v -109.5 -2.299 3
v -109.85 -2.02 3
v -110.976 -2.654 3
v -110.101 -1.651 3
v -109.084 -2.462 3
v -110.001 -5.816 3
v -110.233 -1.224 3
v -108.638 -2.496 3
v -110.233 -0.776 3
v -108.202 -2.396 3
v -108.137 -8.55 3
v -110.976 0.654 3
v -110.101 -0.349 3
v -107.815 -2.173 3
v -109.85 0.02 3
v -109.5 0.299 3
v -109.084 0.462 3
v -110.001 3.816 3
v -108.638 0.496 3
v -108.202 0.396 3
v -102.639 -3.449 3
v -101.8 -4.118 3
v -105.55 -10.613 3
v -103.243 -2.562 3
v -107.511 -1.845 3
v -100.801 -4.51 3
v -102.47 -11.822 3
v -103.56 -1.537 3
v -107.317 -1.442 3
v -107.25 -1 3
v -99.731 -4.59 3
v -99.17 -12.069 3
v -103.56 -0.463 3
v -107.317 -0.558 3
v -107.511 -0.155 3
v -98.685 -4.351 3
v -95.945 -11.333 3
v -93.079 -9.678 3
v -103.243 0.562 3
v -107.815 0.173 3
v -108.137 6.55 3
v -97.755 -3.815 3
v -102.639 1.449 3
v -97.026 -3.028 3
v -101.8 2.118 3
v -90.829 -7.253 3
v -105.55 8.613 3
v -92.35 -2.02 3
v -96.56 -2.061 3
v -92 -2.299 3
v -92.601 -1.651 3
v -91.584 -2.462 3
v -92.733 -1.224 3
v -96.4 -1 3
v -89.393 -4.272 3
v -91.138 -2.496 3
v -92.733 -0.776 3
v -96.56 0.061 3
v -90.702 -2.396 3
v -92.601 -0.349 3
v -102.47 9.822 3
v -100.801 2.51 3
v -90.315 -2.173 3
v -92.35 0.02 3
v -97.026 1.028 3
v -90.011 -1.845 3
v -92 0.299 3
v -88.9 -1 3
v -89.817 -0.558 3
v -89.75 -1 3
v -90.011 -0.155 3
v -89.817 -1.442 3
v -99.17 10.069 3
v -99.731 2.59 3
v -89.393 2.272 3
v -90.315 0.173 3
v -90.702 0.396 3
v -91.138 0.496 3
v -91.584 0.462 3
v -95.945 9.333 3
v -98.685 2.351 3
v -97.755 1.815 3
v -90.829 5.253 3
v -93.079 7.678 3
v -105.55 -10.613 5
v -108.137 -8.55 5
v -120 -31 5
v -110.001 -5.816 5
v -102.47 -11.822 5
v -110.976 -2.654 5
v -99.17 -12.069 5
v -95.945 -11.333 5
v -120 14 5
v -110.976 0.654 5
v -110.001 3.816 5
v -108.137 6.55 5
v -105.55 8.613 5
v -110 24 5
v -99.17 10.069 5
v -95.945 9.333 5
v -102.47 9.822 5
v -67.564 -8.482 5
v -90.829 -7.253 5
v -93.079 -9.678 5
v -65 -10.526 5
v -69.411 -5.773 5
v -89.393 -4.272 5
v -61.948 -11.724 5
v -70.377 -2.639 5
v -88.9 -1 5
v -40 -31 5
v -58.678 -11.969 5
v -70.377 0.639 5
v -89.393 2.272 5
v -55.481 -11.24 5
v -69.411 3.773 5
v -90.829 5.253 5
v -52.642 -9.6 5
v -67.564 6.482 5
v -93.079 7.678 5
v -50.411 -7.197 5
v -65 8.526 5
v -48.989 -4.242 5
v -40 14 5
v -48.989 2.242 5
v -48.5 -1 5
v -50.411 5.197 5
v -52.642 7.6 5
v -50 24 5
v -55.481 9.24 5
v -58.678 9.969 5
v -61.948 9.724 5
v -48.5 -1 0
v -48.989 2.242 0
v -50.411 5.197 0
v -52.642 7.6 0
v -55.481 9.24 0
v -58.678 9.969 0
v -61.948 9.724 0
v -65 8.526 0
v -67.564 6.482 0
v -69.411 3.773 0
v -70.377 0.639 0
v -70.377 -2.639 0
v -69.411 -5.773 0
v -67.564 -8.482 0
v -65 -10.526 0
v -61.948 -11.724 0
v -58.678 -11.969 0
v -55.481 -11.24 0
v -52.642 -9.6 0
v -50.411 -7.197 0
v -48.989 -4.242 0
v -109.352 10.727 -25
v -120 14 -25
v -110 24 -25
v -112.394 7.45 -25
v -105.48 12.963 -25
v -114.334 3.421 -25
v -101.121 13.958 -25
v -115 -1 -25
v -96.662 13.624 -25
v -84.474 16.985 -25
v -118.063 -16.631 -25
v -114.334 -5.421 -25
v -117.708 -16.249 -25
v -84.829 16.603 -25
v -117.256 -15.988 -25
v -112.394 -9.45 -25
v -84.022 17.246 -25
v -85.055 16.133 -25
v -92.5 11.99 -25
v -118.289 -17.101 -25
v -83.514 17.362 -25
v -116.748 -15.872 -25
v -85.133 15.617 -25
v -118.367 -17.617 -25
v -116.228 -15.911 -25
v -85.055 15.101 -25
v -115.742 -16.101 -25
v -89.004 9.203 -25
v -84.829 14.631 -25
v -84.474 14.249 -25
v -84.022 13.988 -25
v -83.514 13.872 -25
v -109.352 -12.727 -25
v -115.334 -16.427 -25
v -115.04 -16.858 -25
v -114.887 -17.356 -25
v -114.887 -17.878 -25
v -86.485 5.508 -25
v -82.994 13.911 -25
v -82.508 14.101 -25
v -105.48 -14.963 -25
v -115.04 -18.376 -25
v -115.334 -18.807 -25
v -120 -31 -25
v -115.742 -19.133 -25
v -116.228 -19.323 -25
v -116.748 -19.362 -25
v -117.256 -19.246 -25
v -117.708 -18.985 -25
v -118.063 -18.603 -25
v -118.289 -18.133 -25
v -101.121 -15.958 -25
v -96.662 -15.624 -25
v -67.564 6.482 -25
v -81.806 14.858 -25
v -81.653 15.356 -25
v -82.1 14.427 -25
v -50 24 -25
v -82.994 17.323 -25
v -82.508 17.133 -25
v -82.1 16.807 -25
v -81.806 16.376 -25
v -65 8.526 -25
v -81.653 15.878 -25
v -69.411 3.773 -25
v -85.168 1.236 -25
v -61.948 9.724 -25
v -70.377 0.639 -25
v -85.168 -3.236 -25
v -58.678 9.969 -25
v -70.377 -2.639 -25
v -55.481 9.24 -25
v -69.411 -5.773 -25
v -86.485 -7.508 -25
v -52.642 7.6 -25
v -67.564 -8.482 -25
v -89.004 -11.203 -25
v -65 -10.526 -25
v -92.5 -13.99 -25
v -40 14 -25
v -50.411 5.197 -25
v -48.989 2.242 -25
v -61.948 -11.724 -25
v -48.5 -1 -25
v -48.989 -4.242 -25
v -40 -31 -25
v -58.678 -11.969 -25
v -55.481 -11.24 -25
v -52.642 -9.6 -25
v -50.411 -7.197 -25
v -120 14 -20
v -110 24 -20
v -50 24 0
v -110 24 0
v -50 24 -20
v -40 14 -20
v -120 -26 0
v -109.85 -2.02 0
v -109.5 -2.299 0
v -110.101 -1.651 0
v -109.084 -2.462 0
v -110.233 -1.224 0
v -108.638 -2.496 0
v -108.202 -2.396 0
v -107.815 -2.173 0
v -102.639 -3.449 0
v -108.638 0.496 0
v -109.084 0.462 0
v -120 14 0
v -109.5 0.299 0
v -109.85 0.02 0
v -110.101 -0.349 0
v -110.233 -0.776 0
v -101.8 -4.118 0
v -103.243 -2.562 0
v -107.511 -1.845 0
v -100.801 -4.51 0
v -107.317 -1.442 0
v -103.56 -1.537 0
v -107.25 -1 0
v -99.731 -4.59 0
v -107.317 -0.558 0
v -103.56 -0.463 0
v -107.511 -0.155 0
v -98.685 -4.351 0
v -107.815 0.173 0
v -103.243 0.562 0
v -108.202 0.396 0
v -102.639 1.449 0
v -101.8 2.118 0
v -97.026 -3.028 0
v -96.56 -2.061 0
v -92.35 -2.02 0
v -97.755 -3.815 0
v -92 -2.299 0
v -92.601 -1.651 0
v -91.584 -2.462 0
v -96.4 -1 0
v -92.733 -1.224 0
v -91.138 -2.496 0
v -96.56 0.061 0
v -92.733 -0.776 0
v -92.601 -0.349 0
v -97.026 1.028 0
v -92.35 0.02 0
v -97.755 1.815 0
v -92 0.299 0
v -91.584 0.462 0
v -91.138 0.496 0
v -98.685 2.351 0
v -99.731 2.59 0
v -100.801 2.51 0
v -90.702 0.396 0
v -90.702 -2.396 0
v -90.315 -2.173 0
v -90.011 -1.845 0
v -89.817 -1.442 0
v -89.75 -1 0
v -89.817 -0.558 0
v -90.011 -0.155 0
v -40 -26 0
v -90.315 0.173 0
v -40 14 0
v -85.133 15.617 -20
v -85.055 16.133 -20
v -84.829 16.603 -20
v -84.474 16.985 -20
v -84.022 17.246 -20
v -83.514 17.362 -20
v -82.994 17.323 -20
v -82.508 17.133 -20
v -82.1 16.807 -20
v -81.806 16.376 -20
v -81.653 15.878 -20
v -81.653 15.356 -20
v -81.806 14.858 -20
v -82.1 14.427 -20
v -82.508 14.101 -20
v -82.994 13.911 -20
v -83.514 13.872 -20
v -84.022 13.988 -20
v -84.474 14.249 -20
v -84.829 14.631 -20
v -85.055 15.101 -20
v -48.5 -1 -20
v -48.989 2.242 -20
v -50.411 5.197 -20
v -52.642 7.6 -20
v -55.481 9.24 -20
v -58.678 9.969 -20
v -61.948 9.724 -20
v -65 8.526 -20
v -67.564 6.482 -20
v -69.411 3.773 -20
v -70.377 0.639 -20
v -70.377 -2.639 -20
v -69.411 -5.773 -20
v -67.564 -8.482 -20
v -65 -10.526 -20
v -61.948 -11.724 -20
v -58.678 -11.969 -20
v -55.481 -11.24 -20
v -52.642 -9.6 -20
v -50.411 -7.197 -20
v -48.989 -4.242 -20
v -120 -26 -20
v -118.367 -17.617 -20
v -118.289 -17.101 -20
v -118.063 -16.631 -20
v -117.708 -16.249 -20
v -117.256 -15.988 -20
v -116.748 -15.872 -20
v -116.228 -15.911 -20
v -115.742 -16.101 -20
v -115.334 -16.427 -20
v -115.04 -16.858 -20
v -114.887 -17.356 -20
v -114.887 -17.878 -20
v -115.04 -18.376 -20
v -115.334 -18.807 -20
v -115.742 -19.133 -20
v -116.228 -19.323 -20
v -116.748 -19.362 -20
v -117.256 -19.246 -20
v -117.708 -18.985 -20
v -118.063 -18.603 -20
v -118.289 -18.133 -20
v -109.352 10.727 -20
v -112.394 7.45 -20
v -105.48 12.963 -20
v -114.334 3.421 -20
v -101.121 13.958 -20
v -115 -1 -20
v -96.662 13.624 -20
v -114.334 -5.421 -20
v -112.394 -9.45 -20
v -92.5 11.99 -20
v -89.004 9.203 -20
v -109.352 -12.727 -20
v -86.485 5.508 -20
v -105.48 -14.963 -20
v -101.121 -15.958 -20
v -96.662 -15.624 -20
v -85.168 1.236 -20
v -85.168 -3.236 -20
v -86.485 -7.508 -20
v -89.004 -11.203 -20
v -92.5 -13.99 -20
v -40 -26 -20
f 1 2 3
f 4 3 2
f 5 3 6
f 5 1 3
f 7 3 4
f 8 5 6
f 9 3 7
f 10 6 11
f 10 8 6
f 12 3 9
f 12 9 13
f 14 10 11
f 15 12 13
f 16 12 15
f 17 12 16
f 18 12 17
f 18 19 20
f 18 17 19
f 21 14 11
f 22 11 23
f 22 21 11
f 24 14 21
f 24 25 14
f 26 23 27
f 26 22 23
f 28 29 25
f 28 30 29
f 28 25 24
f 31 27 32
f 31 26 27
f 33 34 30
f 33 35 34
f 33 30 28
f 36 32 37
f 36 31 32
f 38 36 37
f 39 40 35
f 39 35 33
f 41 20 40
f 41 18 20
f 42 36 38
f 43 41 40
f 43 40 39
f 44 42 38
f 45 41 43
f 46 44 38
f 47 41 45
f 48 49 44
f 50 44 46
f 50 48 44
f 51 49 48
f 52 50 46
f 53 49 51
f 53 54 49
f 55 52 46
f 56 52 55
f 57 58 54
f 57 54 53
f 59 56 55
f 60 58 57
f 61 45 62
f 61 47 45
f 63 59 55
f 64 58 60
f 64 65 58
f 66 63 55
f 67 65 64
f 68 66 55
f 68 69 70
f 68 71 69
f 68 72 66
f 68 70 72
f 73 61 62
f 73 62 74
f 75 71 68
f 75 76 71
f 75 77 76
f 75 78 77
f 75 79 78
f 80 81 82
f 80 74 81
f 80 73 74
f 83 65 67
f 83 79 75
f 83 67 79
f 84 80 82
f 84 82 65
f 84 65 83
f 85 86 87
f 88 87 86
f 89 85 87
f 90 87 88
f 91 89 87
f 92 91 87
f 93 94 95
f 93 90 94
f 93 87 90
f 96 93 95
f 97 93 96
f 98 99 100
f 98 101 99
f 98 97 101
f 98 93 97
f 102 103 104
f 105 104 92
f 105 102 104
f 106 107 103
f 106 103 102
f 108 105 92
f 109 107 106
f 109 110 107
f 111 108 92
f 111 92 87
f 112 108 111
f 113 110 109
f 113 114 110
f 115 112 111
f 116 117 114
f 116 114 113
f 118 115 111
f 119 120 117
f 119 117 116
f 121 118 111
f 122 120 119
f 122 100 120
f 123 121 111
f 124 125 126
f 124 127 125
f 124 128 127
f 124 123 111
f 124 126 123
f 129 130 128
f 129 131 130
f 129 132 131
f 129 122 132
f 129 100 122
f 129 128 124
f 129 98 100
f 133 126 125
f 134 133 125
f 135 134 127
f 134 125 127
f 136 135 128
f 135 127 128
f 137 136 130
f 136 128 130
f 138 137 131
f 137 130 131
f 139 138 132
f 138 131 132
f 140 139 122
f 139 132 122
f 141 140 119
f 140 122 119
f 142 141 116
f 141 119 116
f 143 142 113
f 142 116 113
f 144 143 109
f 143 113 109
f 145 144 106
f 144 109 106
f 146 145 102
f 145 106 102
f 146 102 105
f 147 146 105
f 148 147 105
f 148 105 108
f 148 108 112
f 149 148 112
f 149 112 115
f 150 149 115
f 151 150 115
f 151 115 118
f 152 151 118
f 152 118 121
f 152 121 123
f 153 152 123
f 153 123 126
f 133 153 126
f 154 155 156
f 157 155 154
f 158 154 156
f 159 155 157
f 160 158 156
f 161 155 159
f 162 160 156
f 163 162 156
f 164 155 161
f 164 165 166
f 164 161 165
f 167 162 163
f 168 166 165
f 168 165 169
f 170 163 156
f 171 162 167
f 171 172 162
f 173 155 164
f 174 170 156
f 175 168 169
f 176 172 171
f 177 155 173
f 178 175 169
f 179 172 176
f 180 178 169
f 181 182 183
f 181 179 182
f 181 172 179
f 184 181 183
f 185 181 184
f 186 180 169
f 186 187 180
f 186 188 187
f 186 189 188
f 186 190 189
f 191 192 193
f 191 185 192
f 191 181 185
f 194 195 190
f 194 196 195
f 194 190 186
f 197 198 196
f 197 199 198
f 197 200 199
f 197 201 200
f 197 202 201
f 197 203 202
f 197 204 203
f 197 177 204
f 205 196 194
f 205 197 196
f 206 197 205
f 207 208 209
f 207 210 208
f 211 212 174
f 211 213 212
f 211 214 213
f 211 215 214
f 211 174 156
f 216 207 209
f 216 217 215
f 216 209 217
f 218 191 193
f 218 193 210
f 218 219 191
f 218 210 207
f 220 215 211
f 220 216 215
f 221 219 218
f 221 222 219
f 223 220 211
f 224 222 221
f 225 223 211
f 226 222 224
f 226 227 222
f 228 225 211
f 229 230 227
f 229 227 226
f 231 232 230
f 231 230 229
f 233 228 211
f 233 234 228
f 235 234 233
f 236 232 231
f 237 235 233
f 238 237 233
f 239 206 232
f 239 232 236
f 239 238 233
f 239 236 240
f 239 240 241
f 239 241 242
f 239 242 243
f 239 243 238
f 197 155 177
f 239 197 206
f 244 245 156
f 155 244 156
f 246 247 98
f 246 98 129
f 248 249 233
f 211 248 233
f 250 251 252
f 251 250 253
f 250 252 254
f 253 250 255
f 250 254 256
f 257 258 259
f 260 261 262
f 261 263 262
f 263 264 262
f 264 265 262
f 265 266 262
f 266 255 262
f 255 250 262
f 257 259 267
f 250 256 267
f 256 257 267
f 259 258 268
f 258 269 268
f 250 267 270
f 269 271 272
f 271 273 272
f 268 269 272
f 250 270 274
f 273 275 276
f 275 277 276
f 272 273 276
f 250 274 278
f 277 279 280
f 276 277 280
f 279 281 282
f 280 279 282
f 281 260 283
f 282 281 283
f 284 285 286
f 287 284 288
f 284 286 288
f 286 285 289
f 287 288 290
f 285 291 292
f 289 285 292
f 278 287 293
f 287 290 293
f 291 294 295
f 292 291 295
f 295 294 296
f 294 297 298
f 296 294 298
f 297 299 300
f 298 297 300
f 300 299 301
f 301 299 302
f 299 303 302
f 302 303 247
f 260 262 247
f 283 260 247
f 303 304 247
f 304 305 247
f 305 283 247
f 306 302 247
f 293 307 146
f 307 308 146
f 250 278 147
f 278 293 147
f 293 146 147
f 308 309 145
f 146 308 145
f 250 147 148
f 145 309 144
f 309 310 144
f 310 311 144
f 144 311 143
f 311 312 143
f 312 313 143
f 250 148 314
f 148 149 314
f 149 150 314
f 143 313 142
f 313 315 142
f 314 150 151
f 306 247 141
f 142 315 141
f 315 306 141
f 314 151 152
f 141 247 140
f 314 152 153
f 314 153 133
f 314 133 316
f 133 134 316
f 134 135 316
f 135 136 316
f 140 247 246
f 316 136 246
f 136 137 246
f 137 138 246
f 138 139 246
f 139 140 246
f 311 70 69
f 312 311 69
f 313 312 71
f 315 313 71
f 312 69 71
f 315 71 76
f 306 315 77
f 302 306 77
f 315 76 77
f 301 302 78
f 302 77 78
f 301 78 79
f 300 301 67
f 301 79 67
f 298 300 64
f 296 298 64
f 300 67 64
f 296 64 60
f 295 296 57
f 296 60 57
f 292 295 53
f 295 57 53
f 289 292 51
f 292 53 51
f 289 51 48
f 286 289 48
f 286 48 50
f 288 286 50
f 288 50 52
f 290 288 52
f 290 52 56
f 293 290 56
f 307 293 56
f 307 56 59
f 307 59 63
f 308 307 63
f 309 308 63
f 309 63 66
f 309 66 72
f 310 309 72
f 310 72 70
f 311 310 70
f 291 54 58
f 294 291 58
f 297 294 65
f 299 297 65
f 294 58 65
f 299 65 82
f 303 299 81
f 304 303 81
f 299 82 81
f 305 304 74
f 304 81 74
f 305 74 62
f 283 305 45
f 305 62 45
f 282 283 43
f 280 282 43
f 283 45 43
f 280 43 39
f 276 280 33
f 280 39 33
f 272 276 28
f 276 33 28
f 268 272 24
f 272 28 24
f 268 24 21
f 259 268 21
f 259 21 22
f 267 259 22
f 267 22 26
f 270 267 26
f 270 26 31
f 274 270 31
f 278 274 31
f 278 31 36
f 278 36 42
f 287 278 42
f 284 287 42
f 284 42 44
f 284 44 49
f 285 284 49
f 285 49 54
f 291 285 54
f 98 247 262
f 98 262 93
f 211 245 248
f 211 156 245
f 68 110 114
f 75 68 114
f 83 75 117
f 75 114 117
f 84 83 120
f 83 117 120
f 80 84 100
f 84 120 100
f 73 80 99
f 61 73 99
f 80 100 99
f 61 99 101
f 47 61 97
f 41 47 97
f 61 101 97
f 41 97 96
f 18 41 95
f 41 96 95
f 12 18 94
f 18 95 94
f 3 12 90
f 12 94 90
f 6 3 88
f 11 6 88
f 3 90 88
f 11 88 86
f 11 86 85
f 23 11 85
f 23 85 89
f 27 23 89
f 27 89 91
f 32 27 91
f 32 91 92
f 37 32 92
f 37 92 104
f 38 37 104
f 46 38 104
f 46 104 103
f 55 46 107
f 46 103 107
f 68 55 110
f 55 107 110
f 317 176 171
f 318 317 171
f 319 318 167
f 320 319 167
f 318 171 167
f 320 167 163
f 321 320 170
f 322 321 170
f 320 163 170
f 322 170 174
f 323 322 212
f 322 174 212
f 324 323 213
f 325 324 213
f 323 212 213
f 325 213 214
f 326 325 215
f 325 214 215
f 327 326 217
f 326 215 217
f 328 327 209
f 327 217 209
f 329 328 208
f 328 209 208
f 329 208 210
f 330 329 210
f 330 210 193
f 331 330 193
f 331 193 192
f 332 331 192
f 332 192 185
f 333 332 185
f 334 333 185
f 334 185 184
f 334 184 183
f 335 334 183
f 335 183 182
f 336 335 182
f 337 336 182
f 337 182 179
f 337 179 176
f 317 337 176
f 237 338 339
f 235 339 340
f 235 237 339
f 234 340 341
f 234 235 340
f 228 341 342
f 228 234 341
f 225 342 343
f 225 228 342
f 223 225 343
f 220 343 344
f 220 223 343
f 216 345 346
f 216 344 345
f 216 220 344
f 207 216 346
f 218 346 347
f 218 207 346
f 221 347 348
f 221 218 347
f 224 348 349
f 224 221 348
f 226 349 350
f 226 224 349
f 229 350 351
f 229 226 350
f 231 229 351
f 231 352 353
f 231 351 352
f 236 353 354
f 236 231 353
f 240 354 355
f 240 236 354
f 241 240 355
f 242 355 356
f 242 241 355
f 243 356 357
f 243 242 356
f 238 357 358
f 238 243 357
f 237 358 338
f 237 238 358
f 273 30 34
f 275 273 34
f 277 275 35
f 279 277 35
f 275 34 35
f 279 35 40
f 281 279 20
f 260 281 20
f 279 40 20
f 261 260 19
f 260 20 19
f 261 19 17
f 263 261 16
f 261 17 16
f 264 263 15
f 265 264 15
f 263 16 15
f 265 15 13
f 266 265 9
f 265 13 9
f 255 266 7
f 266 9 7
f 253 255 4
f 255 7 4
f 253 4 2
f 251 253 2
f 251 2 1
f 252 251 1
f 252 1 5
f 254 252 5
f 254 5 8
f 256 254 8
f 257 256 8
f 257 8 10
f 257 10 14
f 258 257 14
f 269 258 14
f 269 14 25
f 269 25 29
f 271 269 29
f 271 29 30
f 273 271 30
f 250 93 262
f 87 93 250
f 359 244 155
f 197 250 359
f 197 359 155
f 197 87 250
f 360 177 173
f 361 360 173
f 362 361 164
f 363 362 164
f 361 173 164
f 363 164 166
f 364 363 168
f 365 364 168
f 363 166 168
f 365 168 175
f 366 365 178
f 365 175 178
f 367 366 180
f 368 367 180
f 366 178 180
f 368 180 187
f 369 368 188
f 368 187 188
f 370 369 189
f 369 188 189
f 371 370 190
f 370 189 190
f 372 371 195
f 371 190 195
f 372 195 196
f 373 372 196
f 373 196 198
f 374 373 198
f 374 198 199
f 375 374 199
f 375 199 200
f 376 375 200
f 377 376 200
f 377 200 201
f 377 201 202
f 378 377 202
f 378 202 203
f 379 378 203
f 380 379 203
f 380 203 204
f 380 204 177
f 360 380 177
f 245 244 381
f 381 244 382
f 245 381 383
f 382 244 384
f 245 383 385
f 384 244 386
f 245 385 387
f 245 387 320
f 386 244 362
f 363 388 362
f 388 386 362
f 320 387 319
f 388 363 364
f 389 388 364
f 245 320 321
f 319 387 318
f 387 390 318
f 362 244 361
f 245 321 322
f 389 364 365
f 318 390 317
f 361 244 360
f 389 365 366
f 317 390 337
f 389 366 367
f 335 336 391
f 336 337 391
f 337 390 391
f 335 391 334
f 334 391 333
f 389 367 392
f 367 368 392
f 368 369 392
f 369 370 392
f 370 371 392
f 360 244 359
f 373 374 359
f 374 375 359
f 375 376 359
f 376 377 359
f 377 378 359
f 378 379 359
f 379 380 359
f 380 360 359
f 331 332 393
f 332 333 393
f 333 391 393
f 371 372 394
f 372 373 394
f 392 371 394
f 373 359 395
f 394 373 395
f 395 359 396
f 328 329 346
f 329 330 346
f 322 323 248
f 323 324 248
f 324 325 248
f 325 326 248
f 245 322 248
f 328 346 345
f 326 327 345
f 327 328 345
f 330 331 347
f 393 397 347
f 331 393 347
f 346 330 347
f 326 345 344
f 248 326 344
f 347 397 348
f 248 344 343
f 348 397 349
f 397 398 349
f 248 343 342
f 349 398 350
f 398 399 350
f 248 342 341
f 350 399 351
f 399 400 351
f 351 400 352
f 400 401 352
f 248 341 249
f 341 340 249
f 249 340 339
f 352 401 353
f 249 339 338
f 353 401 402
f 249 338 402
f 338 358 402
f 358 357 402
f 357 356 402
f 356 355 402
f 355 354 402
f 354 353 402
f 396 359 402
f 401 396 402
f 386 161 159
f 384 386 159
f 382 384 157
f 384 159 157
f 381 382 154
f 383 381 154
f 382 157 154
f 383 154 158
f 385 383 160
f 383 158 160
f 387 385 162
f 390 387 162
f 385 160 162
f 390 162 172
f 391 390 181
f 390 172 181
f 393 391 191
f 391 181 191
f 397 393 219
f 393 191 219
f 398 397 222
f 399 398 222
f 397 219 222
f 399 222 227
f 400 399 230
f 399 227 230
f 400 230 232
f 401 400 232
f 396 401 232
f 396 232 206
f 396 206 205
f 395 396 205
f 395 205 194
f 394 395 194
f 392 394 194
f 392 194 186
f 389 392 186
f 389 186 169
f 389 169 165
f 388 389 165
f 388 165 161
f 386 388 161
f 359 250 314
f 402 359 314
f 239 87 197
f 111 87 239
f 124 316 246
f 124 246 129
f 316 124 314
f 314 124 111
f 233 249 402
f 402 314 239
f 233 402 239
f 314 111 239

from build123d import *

# Parameters (mm, degrees)
SKETCH1_W           = 80
SKETCH1_H           = 50
BOSS_EXTRUDE1_DEPTH = 5
SKETCH2_R           = 3.6
CUT_EXTRUDE1_DEPTH  = 123.886126149
SKETCH3_R           = 1.5
CUT_EXTRUDE2_DEPTH  = 123.886126149
SKETCH4_R           = 11.1
CUT_EXTRUDE3_DEPTH  = 2
SKETCH5_R           = 11
CUT_EXTRUDE4_DEPTH  = 123.886126149
SKETCH7_W           = 80
SKETCH7_H           = 30
BOSS_EXTRUDE2_DEPTH = 5
SKETCH13_W          = 80
SKETCH13_H          = 5
BOSS_EXTRUDE3_DEPTH = 50
CUT_EXTRUDE6_REACH  = 129.519
SKETCH14_R          = 15
CUT_EXTRUDE7_REACH  = 129.519
SKETCH16_R          = 1.75
CHAMFER1_SIZE       = 10


with BuildPart() as part:
    # Sketch1 → Boss-Extrude1 (new body)
    with BuildSketch(Plane.XY):
        with Locations((-80, -1)):
            Rectangle(SKETCH1_W, SKETCH1_H)
    extrude(amount=BOSS_EXTRUDE1_DEPTH)

    # Sketch2 → Cut-Extrude1 (cut, through all)
    with BuildSketch(Plane.XY.offset(5)):
        with Locations((-100, -1)):
            Circle(SKETCH2_R)
    extrude(amount=-CUT_EXTRUDE1_DEPTH, mode=Mode.SUBTRACT)

    # Sketch3 → Cut-Extrude2 (cut, through all)
    with BuildSketch(Plane.XY.offset(5)):
        with Locations((-91.25, -1)):
            Circle(SKETCH3_R)
        with Locations((-108.75, -1)):
            Circle(SKETCH3_R)
    extrude(amount=-CUT_EXTRUDE2_DEPTH, mode=Mode.SUBTRACT)

    # Sketch4 → Cut-Extrude3 (cut)
    with BuildSketch(Plane.XY.offset(5)):
        with Locations((-100, -1)):
            Circle(SKETCH4_R)
    extrude(amount=-CUT_EXTRUDE3_DEPTH, mode=Mode.SUBTRACT)

    # Sketch5 → Cut-Extrude4 (cut, through all)
    with BuildSketch(Plane.XY.offset(5)):
        with Locations((-59.5, -1)):
            Circle(SKETCH5_R)
    cut_extrude4 = extrude(amount=-CUT_EXTRUDE4_DEPTH, mode=Mode.SUBTRACT)

    # Sketch7 → Boss-Extrude2 (add)
    with BuildSketch(Plane.XZ.offset(26)):
        with Locations((-80, -10)):
            Rectangle(SKETCH7_W, SKETCH7_H)
    extrude(amount=BOSS_EXTRUDE2_DEPTH)

    # Sketch13 → Boss-Extrude3 (add)
    with BuildSketch(Plane(origin=(0, -26, 0), x_dir=(1, 0, 0), z_dir=(0, 1, 0))):
        with Locations((-80, 22.5)):
            Rectangle(SKETCH13_W, SKETCH13_H)
    extrude(amount=BOSS_EXTRUDE3_DEPTH)

    # Sketch14 → Cut-Extrude6 (cut, up to next)
    with BuildSketch(Plane(origin=(0, 0, -25), x_dir=(-1, 0, 0), z_dir=(0, 0, -1)), mode=Mode.PRIVATE) as cut_extrude6_sk1:
        with Locations((100, -1)):
            Circle(SKETCH14_R)
    cut_extrude6_tool1 = extrude(cut_extrude6_sk1.sketch, amount=-CUT_EXTRUDE6_REACH, mode=Mode.PRIVATE) & part.part
    add(cut_extrude6_tool1.solids().sort_by_distance((-100, -1, -25))[0], mode=Mode.SUBTRACT)

    # Sketch16 → Cut-Extrude7 (cut, up to next)
    with BuildSketch(Plane(origin=(0, 0, -25), x_dir=(-1, 0, 0), z_dir=(0, 0, -1)), mode=Mode.PRIVATE) as cut_extrude7_sk1:
        with Locations((83.382990642, 15.617009358)):
            Circle(SKETCH16_R)
    cut_extrude7_tool1 = extrude(cut_extrude7_sk1.sketch, amount=-CUT_EXTRUDE7_REACH, mode=Mode.PRIVATE) & part.part
    # Sketch16 → Cut-Extrude7 (cut, up to next)
    with BuildSketch(Plane(origin=(0, 0, -25), x_dir=(-1, 0, 0), z_dir=(0, 0, -1)), mode=Mode.PRIVATE) as cut_extrude7_sk2:
        with Locations((116.617009358, -17.617009358)):
            Circle(SKETCH16_R)
    cut_extrude7_tool2 = extrude(cut_extrude7_sk2.sketch, amount=-CUT_EXTRUDE7_REACH, mode=Mode.PRIVATE) & part.part
    add(cut_extrude7_tool1.solids().sort_by_distance((-83.382991, 15.617009, -25))[0], mode=Mode.SUBTRACT)
    add(cut_extrude7_tool2.solids().sort_by_distance((-116.617009, -17.617009, -25))[0], mode=Mode.SUBTRACT)

    # Mirror6: Cut-Extrude4 across plane
    add(cut_extrude4.mirror(Plane(origin=(0, 0, -10), x_dir=(1, 0, 0), z_dir=(0, 0, -1))), mode=Mode.SUBTRACT)

    # Chamfer1
    chamfer1_edges = [part.edges().sort_by_distance(p)[0] for p in [
        (-40, 24, -22.5),
        (-120, 24, -22.5),
        (-120, 24, 2.5),
        (-40, 24, 2.5),
    ]]
    chamfer(chamfer1_edges, length=CHAMFER1_SIZE)


solid = part.part
